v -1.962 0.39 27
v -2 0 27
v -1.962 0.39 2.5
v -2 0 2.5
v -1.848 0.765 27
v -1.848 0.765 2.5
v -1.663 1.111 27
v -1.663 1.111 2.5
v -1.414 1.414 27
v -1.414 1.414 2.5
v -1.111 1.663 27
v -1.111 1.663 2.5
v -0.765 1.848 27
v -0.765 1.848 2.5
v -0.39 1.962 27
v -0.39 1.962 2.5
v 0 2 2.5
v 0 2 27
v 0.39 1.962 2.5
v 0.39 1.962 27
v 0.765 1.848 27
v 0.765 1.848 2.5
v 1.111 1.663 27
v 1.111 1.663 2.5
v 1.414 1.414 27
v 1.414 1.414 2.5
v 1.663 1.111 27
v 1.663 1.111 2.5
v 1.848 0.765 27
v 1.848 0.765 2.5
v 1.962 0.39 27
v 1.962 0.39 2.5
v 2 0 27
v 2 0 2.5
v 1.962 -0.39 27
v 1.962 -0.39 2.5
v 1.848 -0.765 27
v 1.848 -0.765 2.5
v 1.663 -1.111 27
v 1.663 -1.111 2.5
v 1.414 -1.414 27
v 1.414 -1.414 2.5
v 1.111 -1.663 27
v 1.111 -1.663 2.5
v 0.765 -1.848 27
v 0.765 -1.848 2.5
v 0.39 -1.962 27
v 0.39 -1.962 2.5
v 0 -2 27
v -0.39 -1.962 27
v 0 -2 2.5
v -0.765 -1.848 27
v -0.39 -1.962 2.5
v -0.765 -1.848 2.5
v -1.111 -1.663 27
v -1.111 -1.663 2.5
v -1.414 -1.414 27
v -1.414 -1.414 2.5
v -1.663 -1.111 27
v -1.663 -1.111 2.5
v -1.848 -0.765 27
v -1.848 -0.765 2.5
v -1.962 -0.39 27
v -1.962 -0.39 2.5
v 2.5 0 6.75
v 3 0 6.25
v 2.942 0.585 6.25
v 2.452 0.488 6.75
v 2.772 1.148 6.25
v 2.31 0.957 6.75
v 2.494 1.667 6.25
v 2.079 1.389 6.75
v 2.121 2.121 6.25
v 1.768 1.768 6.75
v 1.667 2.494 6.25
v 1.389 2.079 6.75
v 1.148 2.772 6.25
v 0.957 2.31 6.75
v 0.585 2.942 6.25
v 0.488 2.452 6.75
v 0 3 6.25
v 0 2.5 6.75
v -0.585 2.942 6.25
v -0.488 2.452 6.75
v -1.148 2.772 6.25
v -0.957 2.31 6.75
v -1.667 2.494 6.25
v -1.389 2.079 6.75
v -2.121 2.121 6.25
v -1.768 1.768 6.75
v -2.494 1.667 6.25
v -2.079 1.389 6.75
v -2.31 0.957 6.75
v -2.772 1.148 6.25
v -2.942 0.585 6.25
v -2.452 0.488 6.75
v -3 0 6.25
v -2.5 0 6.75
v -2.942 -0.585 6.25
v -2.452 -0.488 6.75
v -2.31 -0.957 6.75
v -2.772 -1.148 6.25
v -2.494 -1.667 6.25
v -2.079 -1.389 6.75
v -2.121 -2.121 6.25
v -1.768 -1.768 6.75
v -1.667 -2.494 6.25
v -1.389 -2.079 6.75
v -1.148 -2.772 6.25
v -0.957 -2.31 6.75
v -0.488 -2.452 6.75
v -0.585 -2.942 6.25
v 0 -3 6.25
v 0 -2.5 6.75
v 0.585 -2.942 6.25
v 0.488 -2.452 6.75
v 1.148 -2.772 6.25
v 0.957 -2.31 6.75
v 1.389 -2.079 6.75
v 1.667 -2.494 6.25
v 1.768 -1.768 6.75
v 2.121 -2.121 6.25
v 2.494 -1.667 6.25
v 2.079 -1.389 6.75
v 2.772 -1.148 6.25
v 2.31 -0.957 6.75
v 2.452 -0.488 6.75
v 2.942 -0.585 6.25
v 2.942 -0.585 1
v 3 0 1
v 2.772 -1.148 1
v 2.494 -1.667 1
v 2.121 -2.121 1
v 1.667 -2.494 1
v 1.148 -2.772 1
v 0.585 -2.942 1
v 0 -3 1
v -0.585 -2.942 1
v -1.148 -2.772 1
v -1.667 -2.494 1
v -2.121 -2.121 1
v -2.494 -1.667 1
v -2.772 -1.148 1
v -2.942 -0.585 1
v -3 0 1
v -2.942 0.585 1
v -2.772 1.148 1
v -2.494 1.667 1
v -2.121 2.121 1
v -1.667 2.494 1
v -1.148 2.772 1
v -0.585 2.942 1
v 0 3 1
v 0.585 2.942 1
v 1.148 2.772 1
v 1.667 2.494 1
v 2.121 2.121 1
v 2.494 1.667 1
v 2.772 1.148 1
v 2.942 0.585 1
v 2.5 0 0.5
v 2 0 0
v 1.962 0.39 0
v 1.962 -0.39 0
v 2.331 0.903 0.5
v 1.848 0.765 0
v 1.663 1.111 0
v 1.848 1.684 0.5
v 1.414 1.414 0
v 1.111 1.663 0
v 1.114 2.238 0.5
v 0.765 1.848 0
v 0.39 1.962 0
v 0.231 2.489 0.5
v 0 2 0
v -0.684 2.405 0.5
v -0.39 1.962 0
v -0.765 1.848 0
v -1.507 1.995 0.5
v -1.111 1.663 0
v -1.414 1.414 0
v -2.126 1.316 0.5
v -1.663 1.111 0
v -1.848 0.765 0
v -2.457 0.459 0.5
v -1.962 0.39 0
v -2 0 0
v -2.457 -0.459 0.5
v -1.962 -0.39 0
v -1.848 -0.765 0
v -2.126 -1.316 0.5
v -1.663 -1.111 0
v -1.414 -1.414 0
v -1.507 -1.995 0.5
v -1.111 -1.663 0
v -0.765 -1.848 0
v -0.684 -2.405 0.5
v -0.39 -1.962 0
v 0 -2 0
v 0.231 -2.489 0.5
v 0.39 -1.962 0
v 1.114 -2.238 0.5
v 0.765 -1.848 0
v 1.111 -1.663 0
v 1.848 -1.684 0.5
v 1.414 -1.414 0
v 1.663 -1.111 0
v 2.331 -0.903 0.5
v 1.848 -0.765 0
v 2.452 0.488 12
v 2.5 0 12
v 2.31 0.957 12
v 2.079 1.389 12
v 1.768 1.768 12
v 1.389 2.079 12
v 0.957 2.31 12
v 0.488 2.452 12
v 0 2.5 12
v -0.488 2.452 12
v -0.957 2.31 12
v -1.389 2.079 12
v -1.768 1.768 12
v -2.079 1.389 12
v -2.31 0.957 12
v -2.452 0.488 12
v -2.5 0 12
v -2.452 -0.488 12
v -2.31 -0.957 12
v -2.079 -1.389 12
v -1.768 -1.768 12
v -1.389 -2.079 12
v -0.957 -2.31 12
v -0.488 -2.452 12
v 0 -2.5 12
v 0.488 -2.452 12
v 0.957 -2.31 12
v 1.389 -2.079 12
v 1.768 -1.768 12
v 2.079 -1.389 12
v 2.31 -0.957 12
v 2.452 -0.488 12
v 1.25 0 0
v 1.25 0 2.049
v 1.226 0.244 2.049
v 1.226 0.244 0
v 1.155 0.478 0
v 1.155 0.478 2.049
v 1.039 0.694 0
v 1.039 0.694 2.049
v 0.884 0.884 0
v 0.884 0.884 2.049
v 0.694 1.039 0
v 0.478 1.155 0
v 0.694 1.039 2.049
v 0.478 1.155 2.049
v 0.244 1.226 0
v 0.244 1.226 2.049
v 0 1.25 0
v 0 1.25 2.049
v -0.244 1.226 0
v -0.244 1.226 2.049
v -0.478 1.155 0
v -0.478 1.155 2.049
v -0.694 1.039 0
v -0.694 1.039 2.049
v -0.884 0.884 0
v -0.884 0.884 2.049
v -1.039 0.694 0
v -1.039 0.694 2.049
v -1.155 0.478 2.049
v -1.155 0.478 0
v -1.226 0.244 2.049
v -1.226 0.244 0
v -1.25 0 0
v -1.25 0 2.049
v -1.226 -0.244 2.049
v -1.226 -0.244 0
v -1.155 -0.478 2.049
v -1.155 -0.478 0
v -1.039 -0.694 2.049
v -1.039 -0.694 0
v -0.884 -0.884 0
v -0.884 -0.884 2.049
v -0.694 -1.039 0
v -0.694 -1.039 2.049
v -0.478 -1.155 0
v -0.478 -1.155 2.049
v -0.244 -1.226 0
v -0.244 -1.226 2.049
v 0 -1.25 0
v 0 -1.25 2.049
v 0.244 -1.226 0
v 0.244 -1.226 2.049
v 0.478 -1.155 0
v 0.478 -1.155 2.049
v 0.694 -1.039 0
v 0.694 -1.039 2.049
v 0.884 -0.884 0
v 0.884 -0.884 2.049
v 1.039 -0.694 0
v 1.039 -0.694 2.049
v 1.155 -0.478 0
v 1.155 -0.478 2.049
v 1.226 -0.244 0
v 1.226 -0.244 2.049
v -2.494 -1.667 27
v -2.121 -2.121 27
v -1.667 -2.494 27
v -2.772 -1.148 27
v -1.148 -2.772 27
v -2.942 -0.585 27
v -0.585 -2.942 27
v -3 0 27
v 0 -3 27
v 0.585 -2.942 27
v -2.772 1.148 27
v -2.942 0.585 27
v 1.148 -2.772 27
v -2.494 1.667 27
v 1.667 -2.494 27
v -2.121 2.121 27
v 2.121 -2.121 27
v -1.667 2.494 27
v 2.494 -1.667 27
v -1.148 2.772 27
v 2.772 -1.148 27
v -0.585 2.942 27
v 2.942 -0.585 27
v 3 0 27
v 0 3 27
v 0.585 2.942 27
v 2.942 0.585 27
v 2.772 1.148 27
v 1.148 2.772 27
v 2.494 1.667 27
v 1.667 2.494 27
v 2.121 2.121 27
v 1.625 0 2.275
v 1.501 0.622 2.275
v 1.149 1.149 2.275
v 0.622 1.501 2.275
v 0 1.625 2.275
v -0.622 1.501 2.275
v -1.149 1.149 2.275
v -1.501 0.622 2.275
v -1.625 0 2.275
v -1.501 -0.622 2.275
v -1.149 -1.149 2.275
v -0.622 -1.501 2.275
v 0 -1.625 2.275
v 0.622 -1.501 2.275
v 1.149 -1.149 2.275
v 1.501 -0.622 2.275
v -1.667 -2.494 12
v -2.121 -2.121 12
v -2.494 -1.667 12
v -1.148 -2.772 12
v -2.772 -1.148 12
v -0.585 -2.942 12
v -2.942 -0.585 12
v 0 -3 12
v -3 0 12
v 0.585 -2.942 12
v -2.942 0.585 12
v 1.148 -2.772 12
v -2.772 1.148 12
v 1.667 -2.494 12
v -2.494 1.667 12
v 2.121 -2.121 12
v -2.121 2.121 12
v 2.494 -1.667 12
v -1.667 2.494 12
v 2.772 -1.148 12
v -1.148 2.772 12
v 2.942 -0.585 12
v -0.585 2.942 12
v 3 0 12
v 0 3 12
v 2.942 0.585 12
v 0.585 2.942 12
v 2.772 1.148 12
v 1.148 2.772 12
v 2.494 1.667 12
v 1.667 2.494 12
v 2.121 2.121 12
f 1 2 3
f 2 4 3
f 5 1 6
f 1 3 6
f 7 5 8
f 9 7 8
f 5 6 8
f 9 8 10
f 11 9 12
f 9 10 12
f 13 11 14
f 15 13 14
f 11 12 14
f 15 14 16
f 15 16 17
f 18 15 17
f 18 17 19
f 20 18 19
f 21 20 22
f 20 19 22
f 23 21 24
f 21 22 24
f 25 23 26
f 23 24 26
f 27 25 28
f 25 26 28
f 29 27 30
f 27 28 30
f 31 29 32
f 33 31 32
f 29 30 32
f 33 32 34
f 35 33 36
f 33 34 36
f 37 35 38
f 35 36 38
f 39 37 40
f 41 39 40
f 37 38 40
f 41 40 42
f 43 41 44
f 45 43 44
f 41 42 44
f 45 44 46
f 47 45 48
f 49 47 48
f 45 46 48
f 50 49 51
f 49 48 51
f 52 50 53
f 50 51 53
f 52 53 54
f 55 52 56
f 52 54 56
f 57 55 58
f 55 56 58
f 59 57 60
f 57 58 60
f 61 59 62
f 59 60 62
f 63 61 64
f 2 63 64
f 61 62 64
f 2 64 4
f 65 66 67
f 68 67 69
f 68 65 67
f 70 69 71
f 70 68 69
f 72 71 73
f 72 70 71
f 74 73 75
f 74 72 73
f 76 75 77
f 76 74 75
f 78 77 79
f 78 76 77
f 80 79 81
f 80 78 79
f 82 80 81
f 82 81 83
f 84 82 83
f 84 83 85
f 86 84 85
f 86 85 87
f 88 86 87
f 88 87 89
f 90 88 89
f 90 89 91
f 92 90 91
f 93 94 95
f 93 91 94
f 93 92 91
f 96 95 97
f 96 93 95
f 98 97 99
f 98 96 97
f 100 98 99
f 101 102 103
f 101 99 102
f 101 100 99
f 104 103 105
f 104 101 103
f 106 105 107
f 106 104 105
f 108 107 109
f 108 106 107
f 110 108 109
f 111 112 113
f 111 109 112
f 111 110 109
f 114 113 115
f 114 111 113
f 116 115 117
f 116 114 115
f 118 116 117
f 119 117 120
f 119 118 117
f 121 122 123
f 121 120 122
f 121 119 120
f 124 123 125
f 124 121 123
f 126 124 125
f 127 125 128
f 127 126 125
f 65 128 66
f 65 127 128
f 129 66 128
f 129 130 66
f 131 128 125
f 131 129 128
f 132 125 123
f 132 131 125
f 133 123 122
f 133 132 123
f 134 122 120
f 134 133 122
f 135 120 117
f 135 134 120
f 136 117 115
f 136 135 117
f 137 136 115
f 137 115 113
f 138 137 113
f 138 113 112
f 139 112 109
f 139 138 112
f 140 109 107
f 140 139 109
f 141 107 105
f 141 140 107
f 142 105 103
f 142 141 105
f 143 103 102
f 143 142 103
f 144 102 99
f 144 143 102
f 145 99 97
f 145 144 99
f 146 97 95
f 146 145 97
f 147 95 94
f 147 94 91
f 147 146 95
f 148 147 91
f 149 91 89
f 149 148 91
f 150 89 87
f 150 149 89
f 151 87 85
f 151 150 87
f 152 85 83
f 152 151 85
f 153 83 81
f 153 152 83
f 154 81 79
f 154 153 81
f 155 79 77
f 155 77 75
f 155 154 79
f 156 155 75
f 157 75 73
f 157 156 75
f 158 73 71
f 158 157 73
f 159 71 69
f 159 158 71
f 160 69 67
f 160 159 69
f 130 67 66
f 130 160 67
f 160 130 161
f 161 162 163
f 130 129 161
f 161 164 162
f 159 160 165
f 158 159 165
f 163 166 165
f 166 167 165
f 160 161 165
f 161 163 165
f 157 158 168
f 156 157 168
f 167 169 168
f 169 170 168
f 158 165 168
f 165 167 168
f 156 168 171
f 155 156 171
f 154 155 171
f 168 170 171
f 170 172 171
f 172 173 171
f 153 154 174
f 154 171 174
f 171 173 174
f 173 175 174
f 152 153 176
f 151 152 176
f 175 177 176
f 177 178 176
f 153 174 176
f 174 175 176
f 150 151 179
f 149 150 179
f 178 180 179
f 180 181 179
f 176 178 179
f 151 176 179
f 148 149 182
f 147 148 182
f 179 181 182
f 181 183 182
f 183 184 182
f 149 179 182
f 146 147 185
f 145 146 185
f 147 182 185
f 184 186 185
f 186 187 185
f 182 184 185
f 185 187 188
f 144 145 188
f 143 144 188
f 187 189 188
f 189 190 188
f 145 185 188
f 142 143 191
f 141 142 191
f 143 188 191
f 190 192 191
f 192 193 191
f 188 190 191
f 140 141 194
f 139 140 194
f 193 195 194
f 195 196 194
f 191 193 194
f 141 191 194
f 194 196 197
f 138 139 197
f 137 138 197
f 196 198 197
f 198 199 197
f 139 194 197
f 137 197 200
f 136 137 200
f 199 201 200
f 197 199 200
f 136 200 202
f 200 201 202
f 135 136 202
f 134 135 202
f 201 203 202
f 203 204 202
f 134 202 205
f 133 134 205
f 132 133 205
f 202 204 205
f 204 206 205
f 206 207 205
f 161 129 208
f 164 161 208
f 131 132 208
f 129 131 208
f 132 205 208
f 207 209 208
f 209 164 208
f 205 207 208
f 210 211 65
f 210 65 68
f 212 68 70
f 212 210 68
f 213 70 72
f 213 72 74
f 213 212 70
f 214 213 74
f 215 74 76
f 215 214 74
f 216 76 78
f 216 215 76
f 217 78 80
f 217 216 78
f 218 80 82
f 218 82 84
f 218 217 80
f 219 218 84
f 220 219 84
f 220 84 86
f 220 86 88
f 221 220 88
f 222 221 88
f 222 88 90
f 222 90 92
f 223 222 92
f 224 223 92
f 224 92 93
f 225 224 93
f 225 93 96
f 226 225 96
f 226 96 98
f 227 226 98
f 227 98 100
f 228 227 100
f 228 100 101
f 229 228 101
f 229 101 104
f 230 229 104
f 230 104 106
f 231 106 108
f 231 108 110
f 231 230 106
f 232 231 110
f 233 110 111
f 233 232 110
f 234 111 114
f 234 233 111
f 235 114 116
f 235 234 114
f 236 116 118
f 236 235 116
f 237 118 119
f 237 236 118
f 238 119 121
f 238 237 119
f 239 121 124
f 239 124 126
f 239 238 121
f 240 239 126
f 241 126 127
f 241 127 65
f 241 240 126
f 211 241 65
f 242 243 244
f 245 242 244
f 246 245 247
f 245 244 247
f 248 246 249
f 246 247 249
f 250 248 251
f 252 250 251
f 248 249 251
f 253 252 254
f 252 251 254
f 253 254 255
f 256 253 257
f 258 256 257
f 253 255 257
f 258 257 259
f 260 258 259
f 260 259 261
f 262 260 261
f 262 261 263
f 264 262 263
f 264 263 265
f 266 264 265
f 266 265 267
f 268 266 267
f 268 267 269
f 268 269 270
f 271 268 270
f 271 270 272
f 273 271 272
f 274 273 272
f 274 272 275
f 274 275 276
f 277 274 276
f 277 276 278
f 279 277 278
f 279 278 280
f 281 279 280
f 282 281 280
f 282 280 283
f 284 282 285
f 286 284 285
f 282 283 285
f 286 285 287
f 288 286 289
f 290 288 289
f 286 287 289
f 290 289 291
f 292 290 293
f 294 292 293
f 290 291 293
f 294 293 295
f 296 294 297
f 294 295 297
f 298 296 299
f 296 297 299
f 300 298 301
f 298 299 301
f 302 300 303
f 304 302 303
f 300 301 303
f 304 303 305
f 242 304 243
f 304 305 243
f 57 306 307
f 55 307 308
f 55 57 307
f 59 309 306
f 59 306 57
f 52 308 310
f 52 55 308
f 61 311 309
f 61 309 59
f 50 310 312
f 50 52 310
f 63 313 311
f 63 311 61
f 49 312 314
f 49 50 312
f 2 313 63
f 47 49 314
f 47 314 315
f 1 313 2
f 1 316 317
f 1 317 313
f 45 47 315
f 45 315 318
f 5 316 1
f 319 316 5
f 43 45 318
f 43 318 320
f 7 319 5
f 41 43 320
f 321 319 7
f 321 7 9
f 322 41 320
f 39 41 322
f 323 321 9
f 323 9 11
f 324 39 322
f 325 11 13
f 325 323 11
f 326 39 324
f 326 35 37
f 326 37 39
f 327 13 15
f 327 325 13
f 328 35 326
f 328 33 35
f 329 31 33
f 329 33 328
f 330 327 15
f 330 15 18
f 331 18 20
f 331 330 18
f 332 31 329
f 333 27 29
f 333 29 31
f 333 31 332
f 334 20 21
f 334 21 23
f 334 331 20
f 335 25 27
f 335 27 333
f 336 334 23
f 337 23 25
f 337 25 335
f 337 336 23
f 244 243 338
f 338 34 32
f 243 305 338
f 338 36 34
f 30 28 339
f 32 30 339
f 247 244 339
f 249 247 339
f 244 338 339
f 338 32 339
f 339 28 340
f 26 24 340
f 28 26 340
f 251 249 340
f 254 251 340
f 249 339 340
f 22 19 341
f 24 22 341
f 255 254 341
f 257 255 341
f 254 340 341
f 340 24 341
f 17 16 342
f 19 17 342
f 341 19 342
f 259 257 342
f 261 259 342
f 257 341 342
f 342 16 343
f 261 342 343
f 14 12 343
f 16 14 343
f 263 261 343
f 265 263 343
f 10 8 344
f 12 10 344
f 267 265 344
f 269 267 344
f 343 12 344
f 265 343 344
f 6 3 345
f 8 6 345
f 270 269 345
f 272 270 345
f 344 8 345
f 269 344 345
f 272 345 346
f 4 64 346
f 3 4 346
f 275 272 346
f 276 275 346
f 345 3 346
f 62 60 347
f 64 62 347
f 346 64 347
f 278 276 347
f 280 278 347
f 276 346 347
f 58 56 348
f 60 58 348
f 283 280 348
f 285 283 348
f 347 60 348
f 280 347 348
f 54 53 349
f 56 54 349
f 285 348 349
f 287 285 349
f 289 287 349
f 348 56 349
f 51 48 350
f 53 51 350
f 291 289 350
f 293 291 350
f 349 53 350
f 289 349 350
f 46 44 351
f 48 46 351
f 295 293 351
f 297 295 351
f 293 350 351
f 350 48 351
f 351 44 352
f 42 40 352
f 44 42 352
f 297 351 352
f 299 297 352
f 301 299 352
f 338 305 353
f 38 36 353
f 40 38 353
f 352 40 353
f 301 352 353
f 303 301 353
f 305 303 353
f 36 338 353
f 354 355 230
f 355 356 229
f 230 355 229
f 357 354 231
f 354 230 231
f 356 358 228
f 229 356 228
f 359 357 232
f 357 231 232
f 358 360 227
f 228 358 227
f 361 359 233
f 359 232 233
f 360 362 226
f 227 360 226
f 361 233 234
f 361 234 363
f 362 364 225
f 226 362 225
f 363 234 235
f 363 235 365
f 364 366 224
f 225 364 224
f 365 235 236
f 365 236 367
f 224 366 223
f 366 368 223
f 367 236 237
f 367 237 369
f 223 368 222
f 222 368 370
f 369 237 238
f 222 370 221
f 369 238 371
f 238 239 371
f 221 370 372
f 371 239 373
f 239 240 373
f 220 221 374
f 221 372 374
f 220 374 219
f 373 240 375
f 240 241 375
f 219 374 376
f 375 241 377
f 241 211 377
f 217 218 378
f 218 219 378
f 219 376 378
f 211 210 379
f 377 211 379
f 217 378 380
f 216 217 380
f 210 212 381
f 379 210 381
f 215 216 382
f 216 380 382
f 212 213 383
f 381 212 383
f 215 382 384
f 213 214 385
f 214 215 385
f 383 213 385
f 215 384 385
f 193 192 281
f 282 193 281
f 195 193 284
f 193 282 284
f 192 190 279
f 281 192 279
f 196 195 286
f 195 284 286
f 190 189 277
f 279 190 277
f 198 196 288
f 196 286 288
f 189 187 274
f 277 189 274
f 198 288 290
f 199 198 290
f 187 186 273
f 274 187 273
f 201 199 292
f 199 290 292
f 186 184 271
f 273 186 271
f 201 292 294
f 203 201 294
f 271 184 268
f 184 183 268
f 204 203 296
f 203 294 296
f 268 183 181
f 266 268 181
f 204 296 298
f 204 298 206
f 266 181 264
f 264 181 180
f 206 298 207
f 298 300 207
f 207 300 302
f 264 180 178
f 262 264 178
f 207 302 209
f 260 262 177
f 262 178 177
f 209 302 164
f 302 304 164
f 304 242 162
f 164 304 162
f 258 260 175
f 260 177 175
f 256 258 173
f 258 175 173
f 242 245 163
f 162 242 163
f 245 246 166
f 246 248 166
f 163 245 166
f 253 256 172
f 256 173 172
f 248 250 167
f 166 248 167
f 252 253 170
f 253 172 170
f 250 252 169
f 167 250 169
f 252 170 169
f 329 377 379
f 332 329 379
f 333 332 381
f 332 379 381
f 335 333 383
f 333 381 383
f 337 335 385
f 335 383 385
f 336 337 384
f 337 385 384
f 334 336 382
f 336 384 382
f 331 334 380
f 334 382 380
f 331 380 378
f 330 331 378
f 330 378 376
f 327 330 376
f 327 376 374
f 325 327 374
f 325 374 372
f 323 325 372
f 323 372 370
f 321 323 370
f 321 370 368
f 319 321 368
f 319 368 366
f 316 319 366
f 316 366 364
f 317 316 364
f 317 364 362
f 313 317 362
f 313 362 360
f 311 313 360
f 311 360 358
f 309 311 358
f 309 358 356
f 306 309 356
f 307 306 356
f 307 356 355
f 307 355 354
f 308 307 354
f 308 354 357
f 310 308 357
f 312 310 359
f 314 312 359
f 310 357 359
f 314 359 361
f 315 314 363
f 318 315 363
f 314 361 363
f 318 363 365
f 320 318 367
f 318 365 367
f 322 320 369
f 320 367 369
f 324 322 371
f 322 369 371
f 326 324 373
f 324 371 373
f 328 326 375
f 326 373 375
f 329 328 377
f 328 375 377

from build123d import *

# Parameters (mm, degrees)
ESQUISSE1_R                         = 3
BOSS_EXTRU_1_DEPTH                  = 27
DIAM_TRE_DU_PER_AGE_4_0_4_1_D       = 4
DIAM_TRE_DU_PER_AGE_4_0_4_1_DEPTH   = 24.5
DIAM_TRE_DU_PER_AGE_4_0_4_1_TIP     = 1.201721238
DIAM_TRE_DU_PER_AGE_2_5_2_5_2_D     = 2.5
DIAM_TRE_DU_PER_AGE_2_5_2_5_2_DEPTH = 3
DIAM_TRE_DU_PER_AGE_2_5_2_5_2_TIP   = 0.751075774
ENL_V_START                         = -15
ESQUISSE6_W                         = 11.750178357
ESQUISSE6_H                         = 11.384595502
ESQUISSE6_R                         = 2.5
ENL_V_MAT_EXTRU_1_DEPTH             = 6
CHANFREIN1_SIZE                     = 1
CHANFREIN2_SIZE                     = 0.75


with BuildPart() as part:
    # Esquisse1 → Boss.-Extru.1 (new body)
    with BuildSketch(Plane.XY):
        Circle(ESQUISSE1_R)
    extrude(amount=BOSS_EXTRU_1_DEPTH)

    # Diamètre du perçage Ø4.0 (4)1
    with Locations(Plane.XY.offset(27)):
        with Locations((0, 0)):
            Hole(DIAM_TRE_DU_PER_AGE_4_0_4_1_D / 2, depth=DIAM_TRE_DU_PER_AGE_4_0_4_1_DEPTH)
            with Locations((0, 0, -(DIAM_TRE_DU_PER_AGE_4_0_4_1_DEPTH + DIAM_TRE_DU_PER_AGE_4_0_4_1_TIP / 2))):  # 118° drill point
                Cone(0, DIAM_TRE_DU_PER_AGE_4_0_4_1_D / 2, DIAM_TRE_DU_PER_AGE_4_0_4_1_TIP, mode=Mode.SUBTRACT)

    # Diamètre du perçage Ø2.5 (2.5)2
    with Locations(Plane(origin=(0, 0, 0), x_dir=(-1, 0, 0), z_dir=(0, 0, -1))):
        with Locations((0, 0)):
            Hole(DIAM_TRE_DU_PER_AGE_2_5_2_5_2_D / 2, depth=DIAM_TRE_DU_PER_AGE_2_5_2_5_2_DEPTH)
            with Locations((0, 0, -(DIAM_TRE_DU_PER_AGE_2_5_2_5_2_DEPTH + DIAM_TRE_DU_PER_AGE_2_5_2_5_2_TIP / 2))):  # 118° drill point
                Cone(0, DIAM_TRE_DU_PER_AGE_2_5_2_5_2_D / 2, DIAM_TRE_DU_PER_AGE_2_5_2_5_2_TIP, mode=Mode.SUBTRACT)

    # Esquisse6 → Enlèv. mat.-Extru.1 (cut)
    with BuildSketch(Plane.XY.offset(27).offset(ENL_V_START)):
        with Locations((-0.219764127, 0.428836611)):
            Rectangle(ESQUISSE6_W, ESQUISSE6_H)
        Circle(ESQUISSE6_R, mode=Mode.SUBTRACT)
    extrude(amount=-ENL_V_MAT_EXTRU_1_DEPTH, mode=Mode.SUBTRACT)

    # Chanfrein1
    chanfrein1_edges = [part.edges().sort_by_distance(p)[0] for p in [
        (-3, 0, 0),
    ]]
    chamfer(chanfrein1_edges, length=CHANFREIN1_SIZE)

    # Chanfrein2
    # the kernel refuses this chamfer: 0.75 mm, written as the material it adds along each edge
    with BuildSketch(Plane(origin=(0, 0, 6), x_dir=(1, 0, 0), z_dir=(0, -1, 0))) as chanfrein2_piece_1_section:
        Polygon((2.5 + CHANFREIN2_SIZE, 0), (2.5, CHANFREIN2_SIZE), (2.5, 0), align=None)
    chanfrein2_piece_1 = revolve(axis=Axis((0, 0, 6), (0, 0, 1)), mode=Mode.PRIVATE)
    chanfrein2_piece_1 = chanfrein2_piece_1 & Plane(origin=(0, 0, 6.498848263), x_dir=(1, 0, 0), z_dir=(0, 0, -1)) * Cylinder(3, 13, mode=Mode.PRIVATE)
    add(chanfrein2_piece_1)


solid = part.part
